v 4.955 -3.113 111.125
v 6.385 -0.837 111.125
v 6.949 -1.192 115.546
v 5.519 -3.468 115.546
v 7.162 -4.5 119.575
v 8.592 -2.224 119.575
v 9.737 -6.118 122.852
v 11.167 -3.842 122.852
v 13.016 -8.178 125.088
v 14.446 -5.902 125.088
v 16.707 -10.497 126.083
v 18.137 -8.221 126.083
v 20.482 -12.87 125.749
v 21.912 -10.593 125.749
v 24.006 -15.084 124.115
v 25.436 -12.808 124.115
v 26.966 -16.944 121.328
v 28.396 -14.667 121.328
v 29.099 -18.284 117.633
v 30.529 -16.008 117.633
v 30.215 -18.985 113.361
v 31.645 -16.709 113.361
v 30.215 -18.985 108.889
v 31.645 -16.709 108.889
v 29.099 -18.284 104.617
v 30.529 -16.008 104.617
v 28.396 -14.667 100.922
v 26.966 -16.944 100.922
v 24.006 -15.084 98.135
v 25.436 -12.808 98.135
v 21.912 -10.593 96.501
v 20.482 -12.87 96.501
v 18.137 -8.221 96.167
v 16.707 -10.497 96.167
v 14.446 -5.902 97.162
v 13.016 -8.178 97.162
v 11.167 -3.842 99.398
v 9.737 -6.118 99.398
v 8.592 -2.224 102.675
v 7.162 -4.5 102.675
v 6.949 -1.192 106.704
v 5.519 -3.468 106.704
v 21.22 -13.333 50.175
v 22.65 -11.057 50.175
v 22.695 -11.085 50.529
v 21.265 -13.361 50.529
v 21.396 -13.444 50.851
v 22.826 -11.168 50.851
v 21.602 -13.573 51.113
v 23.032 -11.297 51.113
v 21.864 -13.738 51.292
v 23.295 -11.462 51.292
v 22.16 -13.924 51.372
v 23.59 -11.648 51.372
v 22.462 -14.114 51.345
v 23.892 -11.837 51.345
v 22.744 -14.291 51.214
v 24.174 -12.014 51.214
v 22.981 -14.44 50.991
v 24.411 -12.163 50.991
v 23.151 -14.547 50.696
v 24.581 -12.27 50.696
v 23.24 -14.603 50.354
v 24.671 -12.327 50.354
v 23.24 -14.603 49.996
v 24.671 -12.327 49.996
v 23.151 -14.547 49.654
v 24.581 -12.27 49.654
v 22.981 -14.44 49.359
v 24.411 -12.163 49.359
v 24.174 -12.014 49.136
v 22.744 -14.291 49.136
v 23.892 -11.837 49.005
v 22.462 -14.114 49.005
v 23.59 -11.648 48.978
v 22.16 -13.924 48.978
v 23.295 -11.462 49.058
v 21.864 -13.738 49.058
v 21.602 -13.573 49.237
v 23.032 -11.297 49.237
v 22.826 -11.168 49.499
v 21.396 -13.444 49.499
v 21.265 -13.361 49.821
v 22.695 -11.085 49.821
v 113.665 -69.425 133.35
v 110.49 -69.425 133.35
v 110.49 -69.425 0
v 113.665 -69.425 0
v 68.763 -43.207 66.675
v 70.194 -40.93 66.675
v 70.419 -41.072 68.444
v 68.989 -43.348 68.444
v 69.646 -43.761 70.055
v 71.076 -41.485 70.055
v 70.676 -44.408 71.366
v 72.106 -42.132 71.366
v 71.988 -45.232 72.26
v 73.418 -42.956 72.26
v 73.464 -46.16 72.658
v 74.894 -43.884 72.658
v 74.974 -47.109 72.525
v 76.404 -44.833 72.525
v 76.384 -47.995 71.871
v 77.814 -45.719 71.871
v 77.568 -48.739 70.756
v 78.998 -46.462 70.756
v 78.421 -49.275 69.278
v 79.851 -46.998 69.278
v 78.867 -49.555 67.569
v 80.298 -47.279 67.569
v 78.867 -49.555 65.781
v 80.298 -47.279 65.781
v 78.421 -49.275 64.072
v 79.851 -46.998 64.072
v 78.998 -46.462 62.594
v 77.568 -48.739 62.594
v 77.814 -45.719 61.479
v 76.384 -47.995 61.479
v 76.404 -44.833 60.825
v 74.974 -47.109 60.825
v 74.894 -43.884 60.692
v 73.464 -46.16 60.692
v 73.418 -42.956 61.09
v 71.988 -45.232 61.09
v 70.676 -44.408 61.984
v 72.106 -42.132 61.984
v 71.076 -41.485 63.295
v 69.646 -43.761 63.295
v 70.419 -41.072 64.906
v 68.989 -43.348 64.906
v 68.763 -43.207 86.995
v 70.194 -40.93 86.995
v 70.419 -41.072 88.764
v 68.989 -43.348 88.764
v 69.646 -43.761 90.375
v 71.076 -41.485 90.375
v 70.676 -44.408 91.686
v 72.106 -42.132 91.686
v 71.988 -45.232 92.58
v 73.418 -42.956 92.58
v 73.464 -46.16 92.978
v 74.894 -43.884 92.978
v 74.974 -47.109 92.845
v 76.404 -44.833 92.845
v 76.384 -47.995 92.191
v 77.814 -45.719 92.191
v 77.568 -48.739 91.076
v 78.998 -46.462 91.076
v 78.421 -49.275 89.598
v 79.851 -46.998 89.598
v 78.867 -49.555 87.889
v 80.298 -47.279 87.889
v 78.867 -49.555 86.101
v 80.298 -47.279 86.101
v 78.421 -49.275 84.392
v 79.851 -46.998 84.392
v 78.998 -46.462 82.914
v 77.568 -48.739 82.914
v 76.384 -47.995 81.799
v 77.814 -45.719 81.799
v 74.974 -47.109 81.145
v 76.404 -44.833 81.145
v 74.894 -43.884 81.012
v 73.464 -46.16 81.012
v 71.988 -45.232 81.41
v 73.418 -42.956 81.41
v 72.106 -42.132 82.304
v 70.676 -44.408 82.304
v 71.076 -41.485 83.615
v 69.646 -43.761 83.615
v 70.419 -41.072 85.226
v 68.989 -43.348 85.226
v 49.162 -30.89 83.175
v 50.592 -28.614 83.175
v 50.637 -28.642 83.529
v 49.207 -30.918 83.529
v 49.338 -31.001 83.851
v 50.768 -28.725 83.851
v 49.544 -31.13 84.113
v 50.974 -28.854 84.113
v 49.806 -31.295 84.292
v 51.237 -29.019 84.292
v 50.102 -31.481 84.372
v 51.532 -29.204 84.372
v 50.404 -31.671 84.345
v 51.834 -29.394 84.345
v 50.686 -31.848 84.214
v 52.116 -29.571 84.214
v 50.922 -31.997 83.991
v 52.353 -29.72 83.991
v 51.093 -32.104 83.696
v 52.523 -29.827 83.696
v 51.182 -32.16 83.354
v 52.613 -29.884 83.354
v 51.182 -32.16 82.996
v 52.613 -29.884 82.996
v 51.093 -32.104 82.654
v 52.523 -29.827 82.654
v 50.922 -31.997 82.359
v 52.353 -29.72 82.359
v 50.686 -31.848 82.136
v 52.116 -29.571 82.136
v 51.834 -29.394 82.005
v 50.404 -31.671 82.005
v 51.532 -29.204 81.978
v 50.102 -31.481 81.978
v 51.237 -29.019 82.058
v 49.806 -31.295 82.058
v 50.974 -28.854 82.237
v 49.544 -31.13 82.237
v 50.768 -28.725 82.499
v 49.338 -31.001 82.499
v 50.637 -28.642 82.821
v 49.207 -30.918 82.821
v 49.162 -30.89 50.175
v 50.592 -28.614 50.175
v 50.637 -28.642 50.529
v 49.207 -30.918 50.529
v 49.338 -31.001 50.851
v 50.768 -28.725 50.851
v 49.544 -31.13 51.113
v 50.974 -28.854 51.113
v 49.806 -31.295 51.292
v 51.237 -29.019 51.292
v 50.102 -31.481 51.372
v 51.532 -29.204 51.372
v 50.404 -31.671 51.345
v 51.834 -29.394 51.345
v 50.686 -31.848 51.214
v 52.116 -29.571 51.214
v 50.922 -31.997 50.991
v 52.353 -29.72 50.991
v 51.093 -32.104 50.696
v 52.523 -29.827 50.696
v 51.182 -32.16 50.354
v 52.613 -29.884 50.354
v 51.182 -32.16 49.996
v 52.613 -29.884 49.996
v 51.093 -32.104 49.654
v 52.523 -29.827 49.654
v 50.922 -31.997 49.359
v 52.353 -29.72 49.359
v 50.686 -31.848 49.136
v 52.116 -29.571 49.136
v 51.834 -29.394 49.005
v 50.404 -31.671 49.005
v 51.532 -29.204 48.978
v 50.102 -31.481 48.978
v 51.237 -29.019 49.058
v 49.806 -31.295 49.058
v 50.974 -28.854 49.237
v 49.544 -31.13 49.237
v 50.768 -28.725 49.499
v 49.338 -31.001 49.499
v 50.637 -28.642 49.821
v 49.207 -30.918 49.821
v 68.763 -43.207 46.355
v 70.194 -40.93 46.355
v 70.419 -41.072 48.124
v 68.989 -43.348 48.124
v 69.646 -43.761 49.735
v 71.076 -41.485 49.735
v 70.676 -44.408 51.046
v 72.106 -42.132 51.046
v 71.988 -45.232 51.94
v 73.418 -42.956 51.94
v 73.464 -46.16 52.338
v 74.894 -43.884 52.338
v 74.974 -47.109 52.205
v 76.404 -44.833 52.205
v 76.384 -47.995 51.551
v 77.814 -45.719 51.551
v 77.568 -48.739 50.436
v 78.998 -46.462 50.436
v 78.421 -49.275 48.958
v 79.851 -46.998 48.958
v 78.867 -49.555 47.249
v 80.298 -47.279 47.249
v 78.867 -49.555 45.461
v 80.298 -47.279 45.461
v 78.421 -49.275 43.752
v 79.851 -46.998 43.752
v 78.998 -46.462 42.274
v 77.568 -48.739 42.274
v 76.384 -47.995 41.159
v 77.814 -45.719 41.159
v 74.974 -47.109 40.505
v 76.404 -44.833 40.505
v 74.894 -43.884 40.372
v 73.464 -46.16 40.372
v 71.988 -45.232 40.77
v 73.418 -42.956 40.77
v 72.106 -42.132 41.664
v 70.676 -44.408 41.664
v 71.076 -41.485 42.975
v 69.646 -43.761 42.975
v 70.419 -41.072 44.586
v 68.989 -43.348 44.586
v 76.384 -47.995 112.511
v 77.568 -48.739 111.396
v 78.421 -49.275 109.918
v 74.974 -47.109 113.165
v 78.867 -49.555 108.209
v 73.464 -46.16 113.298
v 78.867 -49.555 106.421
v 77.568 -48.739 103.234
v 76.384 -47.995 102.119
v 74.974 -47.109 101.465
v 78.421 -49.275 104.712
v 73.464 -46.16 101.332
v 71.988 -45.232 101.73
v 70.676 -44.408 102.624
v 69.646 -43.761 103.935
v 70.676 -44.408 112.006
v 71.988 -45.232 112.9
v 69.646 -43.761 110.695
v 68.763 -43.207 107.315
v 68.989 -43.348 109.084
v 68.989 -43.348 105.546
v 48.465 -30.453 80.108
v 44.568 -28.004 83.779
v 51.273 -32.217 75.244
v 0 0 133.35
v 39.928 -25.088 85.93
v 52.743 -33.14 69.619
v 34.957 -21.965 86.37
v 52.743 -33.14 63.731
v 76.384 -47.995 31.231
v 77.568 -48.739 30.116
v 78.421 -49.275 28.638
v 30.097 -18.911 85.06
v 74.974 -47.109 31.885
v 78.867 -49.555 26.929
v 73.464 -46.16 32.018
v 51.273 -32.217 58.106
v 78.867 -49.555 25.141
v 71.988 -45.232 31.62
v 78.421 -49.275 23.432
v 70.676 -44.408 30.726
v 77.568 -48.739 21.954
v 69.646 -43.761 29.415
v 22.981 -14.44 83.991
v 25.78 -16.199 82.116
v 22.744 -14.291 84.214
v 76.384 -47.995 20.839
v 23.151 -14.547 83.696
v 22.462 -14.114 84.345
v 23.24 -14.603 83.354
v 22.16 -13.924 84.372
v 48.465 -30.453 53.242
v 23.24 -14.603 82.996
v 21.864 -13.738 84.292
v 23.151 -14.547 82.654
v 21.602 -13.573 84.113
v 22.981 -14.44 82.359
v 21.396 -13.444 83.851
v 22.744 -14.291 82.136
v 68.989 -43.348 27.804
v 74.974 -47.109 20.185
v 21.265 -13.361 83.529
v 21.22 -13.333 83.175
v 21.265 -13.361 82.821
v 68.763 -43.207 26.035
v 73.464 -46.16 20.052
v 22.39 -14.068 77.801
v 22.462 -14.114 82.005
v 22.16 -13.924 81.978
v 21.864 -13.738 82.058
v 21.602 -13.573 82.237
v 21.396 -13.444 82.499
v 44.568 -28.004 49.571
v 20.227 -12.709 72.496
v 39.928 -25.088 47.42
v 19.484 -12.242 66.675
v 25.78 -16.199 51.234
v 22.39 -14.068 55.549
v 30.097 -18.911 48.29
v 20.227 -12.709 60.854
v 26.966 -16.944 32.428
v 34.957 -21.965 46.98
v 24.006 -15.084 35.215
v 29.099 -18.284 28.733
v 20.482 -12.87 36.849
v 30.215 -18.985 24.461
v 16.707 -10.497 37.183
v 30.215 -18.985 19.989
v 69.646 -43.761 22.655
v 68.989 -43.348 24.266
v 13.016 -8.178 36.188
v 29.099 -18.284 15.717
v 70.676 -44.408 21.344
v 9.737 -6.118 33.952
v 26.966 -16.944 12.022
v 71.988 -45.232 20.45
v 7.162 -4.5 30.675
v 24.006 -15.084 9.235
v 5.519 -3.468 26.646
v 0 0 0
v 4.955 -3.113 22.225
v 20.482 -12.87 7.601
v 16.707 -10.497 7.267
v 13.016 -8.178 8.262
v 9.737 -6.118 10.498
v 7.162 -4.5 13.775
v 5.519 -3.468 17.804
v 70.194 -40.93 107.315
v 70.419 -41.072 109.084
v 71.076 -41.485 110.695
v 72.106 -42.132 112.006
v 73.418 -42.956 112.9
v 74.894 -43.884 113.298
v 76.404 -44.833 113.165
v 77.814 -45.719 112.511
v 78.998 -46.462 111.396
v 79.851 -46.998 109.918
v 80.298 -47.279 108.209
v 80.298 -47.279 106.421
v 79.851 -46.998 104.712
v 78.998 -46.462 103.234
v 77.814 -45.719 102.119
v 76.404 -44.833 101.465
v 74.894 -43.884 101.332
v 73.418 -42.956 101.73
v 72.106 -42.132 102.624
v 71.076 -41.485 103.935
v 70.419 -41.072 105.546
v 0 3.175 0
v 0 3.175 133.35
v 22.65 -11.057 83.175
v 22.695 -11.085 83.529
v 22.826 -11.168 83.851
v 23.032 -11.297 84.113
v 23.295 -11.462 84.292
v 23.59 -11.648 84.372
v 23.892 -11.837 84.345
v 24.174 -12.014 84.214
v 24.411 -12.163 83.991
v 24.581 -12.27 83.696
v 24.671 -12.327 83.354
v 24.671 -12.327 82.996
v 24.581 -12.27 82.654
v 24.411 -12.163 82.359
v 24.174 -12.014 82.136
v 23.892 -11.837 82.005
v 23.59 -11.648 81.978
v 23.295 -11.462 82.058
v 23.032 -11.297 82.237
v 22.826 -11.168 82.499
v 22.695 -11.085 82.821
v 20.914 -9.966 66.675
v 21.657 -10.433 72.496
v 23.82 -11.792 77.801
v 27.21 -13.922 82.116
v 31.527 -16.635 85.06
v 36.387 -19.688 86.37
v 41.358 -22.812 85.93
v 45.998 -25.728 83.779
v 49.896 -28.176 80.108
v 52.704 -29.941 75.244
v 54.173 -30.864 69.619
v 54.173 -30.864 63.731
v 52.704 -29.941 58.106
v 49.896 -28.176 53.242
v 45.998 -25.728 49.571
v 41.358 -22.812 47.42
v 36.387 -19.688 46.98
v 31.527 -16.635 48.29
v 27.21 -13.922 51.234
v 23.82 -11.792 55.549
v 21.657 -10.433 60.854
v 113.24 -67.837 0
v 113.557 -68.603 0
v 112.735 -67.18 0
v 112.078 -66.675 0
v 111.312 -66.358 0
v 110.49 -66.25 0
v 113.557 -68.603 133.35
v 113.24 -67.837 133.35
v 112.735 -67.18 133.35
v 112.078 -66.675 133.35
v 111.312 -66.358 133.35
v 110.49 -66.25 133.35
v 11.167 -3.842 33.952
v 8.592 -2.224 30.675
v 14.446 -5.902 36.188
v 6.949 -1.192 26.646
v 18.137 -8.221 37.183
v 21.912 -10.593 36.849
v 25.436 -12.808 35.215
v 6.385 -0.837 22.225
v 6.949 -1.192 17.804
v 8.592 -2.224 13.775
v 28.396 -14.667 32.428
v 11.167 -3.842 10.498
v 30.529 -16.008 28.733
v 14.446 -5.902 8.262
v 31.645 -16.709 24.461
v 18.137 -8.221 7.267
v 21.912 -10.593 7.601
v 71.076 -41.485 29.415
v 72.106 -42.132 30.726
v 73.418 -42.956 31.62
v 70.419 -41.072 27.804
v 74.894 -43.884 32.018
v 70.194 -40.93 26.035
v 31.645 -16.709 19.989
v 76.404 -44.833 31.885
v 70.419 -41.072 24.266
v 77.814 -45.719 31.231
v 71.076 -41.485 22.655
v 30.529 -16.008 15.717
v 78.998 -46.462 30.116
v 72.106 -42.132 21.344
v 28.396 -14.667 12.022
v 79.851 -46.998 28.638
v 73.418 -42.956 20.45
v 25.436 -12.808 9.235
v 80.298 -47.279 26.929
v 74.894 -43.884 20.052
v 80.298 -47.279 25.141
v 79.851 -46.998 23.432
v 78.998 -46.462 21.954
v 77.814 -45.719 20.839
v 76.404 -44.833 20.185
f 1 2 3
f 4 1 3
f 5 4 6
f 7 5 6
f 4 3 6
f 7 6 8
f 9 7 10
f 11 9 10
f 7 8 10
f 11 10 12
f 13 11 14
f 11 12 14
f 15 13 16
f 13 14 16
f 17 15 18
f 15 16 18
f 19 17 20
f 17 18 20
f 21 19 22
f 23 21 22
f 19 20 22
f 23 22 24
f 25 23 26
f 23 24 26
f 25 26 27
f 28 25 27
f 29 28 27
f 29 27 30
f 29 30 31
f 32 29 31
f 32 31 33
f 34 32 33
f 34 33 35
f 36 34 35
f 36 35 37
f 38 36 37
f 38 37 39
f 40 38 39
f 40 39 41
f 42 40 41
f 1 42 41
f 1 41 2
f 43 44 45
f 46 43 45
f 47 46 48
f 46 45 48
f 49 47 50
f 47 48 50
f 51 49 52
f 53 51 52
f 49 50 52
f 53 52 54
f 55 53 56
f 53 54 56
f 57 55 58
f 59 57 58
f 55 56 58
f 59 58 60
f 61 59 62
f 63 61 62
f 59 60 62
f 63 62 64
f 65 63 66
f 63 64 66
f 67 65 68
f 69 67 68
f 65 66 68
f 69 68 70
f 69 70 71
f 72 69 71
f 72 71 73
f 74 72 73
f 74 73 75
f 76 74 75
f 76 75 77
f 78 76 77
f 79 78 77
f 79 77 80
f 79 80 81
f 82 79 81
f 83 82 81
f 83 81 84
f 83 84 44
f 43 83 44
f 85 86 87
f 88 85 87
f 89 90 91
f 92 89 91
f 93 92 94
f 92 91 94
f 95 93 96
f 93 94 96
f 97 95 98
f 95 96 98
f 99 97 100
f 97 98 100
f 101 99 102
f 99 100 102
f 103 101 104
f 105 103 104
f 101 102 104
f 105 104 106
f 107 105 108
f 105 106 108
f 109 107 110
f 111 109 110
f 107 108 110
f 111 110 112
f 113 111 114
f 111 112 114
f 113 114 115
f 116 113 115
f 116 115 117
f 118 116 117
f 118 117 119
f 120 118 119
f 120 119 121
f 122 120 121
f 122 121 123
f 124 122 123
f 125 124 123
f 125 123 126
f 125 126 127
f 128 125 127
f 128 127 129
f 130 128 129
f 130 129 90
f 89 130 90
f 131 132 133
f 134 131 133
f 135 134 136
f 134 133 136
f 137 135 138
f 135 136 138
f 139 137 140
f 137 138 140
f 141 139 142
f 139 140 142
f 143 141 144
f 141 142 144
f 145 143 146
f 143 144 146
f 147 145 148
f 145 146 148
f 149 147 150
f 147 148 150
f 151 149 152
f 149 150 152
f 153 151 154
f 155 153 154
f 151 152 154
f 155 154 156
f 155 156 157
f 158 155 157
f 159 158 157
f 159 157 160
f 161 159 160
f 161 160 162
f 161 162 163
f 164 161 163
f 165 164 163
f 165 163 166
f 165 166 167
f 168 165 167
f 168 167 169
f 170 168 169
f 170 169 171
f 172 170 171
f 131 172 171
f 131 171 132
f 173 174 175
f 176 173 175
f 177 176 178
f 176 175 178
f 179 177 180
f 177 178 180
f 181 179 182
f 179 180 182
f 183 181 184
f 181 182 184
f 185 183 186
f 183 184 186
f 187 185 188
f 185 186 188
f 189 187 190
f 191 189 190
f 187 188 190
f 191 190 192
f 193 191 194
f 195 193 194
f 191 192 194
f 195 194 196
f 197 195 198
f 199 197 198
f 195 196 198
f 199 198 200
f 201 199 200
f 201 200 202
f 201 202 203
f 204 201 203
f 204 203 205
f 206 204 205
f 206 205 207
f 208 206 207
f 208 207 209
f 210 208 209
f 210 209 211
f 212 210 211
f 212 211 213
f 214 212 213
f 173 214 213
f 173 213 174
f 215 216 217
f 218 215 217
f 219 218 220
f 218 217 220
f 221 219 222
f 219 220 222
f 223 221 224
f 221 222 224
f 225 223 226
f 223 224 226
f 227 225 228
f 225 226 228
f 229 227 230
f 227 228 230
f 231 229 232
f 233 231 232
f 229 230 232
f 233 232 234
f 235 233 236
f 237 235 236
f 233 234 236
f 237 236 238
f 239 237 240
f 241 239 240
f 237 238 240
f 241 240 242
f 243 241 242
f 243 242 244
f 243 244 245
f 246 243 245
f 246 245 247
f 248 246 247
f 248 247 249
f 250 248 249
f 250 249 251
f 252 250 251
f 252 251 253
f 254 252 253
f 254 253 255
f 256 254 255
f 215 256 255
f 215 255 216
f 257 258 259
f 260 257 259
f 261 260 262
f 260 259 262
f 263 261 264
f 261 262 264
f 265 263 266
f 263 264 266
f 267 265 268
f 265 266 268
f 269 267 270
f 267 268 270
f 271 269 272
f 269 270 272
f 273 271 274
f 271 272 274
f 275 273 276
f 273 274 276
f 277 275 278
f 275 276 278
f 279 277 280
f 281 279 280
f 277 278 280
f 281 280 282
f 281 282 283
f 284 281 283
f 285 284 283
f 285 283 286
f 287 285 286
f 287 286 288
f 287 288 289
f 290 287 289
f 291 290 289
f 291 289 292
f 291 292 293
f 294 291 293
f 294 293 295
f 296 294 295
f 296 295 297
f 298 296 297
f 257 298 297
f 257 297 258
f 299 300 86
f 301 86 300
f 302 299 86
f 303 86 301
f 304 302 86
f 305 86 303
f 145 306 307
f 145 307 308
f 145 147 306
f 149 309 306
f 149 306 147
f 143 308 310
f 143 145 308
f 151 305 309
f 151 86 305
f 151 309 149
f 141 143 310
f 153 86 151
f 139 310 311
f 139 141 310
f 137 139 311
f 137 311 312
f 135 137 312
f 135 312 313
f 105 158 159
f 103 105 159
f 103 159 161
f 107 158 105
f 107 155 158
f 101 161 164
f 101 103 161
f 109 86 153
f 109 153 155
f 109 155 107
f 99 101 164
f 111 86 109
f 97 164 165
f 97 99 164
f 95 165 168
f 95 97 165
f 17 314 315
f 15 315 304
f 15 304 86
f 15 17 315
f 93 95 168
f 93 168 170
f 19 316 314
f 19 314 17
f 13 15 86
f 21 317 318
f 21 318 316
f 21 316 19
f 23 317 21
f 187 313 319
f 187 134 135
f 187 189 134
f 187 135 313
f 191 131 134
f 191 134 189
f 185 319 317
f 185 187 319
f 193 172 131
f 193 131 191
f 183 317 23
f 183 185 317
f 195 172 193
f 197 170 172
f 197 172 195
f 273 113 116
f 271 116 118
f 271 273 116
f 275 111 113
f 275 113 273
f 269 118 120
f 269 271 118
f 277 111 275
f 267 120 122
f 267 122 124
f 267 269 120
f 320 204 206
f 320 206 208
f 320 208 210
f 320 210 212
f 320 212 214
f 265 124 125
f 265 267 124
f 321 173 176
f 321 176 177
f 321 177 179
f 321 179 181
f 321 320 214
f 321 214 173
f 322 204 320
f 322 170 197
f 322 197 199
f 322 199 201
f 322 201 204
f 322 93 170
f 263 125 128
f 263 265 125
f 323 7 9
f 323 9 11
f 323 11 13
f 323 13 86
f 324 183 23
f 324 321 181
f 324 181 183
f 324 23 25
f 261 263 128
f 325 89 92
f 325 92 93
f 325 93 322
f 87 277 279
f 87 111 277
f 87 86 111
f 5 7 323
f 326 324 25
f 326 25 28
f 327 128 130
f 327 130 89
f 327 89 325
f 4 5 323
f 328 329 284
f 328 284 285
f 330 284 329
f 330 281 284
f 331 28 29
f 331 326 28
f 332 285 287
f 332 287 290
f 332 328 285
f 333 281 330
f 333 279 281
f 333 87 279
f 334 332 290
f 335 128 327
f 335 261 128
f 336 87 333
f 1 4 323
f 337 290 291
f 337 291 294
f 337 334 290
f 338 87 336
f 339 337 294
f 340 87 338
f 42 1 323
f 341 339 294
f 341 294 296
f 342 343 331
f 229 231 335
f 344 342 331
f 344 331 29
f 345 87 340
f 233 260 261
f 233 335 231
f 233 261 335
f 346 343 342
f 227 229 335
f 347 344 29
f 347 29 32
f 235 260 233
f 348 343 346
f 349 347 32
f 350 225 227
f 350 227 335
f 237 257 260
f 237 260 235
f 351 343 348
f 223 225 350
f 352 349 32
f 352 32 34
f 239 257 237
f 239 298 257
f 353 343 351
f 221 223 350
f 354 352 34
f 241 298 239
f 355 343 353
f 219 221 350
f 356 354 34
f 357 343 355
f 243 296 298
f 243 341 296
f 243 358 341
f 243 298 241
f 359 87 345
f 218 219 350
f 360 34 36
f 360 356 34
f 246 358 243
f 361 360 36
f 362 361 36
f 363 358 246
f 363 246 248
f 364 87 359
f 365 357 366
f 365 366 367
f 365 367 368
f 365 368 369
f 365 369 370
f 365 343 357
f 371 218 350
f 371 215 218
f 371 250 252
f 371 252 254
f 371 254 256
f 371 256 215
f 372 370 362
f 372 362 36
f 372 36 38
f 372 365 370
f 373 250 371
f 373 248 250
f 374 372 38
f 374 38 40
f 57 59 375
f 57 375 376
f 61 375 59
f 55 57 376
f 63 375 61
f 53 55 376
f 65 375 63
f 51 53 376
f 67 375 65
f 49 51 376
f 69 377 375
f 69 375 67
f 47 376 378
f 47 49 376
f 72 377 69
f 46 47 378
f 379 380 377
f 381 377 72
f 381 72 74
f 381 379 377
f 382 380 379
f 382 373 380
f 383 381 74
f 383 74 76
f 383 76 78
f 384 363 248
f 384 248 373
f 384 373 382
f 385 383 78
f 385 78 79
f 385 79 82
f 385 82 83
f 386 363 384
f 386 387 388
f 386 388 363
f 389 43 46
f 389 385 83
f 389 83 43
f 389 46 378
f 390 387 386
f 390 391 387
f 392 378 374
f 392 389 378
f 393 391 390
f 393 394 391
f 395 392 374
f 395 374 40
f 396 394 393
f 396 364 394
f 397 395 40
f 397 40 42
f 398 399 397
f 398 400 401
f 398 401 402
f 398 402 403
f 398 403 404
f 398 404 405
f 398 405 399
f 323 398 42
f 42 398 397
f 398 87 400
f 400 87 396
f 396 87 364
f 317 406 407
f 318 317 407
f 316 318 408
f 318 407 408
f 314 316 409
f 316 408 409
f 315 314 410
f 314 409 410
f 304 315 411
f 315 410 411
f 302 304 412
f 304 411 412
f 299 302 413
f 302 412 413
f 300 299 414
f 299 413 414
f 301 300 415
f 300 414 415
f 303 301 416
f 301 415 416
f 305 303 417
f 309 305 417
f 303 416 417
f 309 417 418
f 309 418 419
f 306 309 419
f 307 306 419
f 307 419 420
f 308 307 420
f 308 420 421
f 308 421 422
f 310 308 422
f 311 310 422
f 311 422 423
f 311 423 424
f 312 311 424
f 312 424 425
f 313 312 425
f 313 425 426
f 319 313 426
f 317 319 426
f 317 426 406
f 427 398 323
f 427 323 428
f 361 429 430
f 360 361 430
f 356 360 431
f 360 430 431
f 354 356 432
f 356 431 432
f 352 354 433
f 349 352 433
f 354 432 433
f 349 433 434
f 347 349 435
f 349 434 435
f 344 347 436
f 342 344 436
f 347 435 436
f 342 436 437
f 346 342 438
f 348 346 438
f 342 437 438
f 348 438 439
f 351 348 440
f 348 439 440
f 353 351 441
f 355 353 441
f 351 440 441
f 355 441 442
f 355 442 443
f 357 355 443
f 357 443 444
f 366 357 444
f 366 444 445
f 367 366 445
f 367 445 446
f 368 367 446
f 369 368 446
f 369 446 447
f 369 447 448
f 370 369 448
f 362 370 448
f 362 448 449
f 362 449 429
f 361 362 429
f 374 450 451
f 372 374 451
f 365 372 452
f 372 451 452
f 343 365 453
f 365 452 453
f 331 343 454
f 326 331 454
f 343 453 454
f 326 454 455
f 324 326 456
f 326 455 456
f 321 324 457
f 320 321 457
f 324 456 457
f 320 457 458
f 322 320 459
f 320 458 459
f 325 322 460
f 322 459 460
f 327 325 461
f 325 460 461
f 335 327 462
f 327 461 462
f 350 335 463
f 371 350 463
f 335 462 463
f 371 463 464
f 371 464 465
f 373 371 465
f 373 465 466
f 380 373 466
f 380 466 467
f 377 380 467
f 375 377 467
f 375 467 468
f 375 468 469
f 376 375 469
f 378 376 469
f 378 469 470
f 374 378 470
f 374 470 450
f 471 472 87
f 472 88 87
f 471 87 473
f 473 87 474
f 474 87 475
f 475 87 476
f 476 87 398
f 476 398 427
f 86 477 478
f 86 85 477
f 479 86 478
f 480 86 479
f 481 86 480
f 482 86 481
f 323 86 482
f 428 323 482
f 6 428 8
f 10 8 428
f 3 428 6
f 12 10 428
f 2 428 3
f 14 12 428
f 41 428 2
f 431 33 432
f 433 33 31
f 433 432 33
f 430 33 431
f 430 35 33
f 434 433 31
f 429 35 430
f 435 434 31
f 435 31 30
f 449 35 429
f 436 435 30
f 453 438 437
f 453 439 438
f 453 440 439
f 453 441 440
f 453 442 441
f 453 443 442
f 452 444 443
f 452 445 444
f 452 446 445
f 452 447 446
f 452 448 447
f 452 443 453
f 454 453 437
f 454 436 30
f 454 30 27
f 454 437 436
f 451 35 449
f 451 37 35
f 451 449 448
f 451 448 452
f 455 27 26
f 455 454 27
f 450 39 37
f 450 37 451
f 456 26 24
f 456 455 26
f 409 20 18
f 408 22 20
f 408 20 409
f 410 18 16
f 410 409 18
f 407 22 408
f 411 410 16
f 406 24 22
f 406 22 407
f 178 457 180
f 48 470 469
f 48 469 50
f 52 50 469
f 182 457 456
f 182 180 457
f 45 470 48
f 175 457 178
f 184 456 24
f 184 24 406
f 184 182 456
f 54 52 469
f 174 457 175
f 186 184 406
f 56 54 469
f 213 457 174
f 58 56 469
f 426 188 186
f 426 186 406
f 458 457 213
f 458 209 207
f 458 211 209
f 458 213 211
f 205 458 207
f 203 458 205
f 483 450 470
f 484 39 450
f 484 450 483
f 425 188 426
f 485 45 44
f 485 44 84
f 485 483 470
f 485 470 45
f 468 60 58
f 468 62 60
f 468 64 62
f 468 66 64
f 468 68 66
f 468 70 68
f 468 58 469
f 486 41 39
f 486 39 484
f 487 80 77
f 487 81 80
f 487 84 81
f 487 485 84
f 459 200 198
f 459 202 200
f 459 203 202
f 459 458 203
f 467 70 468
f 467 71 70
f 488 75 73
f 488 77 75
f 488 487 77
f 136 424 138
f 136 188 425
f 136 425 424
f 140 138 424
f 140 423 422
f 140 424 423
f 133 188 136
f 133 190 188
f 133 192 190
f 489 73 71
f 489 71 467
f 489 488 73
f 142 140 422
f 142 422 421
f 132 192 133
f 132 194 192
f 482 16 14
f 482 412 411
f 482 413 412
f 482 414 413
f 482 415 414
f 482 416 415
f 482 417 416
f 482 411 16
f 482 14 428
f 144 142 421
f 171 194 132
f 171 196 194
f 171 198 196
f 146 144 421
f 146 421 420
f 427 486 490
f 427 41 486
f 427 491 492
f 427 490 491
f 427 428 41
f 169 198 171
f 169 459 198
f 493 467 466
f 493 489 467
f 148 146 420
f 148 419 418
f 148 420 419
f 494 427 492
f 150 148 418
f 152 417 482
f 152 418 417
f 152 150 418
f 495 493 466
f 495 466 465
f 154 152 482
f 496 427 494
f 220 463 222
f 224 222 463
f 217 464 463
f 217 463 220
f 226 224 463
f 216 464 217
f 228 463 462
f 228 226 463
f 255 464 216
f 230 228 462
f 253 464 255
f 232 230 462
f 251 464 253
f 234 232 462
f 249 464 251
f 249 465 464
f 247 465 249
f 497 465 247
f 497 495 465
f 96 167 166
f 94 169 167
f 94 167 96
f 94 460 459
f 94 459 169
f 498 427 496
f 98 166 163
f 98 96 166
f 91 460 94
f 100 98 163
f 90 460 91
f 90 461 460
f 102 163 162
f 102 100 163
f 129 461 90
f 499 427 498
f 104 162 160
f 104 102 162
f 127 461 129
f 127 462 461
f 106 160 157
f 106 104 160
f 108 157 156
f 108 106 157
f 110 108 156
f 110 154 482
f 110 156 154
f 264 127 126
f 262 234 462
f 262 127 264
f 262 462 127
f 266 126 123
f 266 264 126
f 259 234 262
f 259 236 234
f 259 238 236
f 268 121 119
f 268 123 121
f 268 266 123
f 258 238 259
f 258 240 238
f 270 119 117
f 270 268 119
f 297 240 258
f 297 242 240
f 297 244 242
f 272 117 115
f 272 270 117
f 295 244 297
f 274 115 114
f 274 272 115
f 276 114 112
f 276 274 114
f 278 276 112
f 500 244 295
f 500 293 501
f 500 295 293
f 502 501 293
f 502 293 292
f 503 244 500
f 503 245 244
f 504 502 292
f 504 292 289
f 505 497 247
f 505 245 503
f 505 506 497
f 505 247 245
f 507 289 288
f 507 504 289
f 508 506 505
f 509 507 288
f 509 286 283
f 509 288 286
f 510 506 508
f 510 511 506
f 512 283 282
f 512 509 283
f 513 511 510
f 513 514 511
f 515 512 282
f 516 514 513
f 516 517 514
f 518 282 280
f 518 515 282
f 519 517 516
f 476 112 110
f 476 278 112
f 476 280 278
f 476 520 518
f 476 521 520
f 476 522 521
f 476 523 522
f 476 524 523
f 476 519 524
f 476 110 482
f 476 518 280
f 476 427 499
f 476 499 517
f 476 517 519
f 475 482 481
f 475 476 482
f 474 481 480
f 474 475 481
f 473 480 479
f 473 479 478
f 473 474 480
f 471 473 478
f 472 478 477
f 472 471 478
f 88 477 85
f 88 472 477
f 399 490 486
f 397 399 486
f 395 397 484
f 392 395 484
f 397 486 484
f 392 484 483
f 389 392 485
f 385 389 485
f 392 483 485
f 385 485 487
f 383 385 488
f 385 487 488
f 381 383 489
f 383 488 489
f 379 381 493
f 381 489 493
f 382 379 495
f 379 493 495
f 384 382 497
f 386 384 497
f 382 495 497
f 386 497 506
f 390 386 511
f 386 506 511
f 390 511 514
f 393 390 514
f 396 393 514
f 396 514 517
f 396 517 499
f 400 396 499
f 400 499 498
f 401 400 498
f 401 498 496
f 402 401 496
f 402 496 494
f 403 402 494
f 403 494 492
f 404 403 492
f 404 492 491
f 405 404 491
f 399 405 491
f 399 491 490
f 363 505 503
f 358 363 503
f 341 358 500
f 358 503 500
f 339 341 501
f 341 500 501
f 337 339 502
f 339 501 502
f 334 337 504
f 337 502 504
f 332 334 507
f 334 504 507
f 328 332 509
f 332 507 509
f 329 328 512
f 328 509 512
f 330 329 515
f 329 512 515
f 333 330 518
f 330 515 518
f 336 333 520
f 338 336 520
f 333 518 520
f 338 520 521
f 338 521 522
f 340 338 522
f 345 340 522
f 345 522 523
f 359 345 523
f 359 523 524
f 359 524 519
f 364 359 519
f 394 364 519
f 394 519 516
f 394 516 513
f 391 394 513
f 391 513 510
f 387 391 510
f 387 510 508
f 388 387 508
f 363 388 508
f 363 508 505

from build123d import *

# Parameters (mm, degrees)
BOSS_EXTRUDE1_DEPTH = 133.35
SKETCH2_R           = 1.2
SKETCH2_R_2         = 19.75
CUT_EXTRUDE1_DEPTH  = 187.593999065
SKETCH3_W           = 133.35
SKETCH3_H           = 3.175
BOSS_EXTRUDE2_DEPTH = 3.175
FILLET1_R           = 3.175
SKETCH5_R           = 15
CUT_EXTRUDE2_DEPTH  = 189.467318942
SKETCH6_R           = 6
SKETCH6_R_2         = 5.999988
CUT_EXTRUDE3_DEPTH  = 189.467318942


with BuildPart() as part:
    # Sketch1 → Boss-Extrude1 (new body)
    with BuildSketch(Plane.XY):
        Polygon((110.49, -69.425000088), (0, 0), (0, 3.175), (110.49, -66.250000088), align=None)
    extrude(amount=BOSS_EXTRUDE1_DEPTH)

    # Sketch2 → Cut-Extrude1 (cut, through all)
    with BuildSketch(Plane(origin=(1.430283892, 2.276299128, 0), x_dir=(0.8467258159330607, -0.5320295035357462, 0), z_dir=(0.5320295035357462, 0.8467258159330607, 0))):
        with Locations(Location((26.260806326, -83.175, 0), (0, 0, 180))):
            Circle(SKETCH2_R)
        with Locations(Location((42.760806326, -66.675, 0), (0, 0, 180))):
            Circle(SKETCH2_R_2)
        with Locations(Location((59.260806326, -83.175, 0), (0, 0, 180))):
            Circle(SKETCH2_R)
        with Locations(Location((26.260806326, -50.175, 0), (0, 0, 180))):
            Circle(SKETCH2_R)
        with Locations(Location((59.260806326, -50.175, 0), (0, 0, 180))):
            Circle(SKETCH2_R)
    extrude(amount=-CUT_EXTRUDE1_DEPTH, mode=Mode.SUBTRACT)

    # Sketch3 → Boss-Extrude2 (add)
    with BuildSketch(Plane(origin=(110.49, 0, 0), x_dir=(0, 0, -1), z_dir=(1, 0, 0))):
        with Locations((-66.675, -67.837500088)):
            Rectangle(SKETCH3_W, SKETCH3_H)
    extrude(amount=BOSS_EXTRUDE2_DEPTH)

    # Fillet1
    fillet1_edges = [part.edges().sort_by_distance(p)[0] for p in [
        (113.665, -66.250000088, 66.675),
    ]]
    fillet(fillet1_edges, radius=FILLET1_R - 0.0001)  # a hair under: the kernel refuses the full size

    # Sketch5 → Cut-Extrude2 (cut, through all)
    with BuildSketch(Plane(origin=(1.430283892, 2.276299128, 0), x_dir=(0.8467258159330606, -0.5320295035357464, 0), z_dir=(0.5320295035357464, 0.8467258159330606, 0))):
        with Locations(Location((20.851690059, -111.125, 0), (0, 0, 180))):
            Circle(SKETCH5_R)
        with Locations(Location((20.851690059, -22.225, 0), (0, 0, 180))):
            Circle(SKETCH5_R)
    extrude(amount=-CUT_EXTRUDE2_DEPTH, mode=Mode.SUBTRACT)

    # Sketch6 → Cut-Extrude3 (cut, through all)
    with BuildSketch(Plane(origin=(1.430283892, 2.276299128, 0), x_dir=(0.8467258159330606, -0.5320295035357464, 0), z_dir=(0.5320295035357464, 0.8467258159330606, 0))):
        with Locations(Location((87.210806326, -46.355, 0), (0, 0, 180))):
            Circle(SKETCH6_R)
        with Locations(Location((87.210806326, -26.035, 0), (0, 0, 180))):
            Circle(SKETCH6_R)
        with Locations(Location((87.210806326, -86.995, 0), (0, 0, 180))):
            Circle(SKETCH6_R)
        with Locations(Location((87.210806326, -107.315, 0), (0, 0, 180))):
            Circle(SKETCH6_R)
        with Locations(Location((87.210806326, -66.675, 0), (0, 0, 180))):
            Circle(SKETCH6_R_2)
    extrude(amount=-CUT_EXTRUDE3_DEPTH, mode=Mode.SUBTRACT)


solid = part.part
